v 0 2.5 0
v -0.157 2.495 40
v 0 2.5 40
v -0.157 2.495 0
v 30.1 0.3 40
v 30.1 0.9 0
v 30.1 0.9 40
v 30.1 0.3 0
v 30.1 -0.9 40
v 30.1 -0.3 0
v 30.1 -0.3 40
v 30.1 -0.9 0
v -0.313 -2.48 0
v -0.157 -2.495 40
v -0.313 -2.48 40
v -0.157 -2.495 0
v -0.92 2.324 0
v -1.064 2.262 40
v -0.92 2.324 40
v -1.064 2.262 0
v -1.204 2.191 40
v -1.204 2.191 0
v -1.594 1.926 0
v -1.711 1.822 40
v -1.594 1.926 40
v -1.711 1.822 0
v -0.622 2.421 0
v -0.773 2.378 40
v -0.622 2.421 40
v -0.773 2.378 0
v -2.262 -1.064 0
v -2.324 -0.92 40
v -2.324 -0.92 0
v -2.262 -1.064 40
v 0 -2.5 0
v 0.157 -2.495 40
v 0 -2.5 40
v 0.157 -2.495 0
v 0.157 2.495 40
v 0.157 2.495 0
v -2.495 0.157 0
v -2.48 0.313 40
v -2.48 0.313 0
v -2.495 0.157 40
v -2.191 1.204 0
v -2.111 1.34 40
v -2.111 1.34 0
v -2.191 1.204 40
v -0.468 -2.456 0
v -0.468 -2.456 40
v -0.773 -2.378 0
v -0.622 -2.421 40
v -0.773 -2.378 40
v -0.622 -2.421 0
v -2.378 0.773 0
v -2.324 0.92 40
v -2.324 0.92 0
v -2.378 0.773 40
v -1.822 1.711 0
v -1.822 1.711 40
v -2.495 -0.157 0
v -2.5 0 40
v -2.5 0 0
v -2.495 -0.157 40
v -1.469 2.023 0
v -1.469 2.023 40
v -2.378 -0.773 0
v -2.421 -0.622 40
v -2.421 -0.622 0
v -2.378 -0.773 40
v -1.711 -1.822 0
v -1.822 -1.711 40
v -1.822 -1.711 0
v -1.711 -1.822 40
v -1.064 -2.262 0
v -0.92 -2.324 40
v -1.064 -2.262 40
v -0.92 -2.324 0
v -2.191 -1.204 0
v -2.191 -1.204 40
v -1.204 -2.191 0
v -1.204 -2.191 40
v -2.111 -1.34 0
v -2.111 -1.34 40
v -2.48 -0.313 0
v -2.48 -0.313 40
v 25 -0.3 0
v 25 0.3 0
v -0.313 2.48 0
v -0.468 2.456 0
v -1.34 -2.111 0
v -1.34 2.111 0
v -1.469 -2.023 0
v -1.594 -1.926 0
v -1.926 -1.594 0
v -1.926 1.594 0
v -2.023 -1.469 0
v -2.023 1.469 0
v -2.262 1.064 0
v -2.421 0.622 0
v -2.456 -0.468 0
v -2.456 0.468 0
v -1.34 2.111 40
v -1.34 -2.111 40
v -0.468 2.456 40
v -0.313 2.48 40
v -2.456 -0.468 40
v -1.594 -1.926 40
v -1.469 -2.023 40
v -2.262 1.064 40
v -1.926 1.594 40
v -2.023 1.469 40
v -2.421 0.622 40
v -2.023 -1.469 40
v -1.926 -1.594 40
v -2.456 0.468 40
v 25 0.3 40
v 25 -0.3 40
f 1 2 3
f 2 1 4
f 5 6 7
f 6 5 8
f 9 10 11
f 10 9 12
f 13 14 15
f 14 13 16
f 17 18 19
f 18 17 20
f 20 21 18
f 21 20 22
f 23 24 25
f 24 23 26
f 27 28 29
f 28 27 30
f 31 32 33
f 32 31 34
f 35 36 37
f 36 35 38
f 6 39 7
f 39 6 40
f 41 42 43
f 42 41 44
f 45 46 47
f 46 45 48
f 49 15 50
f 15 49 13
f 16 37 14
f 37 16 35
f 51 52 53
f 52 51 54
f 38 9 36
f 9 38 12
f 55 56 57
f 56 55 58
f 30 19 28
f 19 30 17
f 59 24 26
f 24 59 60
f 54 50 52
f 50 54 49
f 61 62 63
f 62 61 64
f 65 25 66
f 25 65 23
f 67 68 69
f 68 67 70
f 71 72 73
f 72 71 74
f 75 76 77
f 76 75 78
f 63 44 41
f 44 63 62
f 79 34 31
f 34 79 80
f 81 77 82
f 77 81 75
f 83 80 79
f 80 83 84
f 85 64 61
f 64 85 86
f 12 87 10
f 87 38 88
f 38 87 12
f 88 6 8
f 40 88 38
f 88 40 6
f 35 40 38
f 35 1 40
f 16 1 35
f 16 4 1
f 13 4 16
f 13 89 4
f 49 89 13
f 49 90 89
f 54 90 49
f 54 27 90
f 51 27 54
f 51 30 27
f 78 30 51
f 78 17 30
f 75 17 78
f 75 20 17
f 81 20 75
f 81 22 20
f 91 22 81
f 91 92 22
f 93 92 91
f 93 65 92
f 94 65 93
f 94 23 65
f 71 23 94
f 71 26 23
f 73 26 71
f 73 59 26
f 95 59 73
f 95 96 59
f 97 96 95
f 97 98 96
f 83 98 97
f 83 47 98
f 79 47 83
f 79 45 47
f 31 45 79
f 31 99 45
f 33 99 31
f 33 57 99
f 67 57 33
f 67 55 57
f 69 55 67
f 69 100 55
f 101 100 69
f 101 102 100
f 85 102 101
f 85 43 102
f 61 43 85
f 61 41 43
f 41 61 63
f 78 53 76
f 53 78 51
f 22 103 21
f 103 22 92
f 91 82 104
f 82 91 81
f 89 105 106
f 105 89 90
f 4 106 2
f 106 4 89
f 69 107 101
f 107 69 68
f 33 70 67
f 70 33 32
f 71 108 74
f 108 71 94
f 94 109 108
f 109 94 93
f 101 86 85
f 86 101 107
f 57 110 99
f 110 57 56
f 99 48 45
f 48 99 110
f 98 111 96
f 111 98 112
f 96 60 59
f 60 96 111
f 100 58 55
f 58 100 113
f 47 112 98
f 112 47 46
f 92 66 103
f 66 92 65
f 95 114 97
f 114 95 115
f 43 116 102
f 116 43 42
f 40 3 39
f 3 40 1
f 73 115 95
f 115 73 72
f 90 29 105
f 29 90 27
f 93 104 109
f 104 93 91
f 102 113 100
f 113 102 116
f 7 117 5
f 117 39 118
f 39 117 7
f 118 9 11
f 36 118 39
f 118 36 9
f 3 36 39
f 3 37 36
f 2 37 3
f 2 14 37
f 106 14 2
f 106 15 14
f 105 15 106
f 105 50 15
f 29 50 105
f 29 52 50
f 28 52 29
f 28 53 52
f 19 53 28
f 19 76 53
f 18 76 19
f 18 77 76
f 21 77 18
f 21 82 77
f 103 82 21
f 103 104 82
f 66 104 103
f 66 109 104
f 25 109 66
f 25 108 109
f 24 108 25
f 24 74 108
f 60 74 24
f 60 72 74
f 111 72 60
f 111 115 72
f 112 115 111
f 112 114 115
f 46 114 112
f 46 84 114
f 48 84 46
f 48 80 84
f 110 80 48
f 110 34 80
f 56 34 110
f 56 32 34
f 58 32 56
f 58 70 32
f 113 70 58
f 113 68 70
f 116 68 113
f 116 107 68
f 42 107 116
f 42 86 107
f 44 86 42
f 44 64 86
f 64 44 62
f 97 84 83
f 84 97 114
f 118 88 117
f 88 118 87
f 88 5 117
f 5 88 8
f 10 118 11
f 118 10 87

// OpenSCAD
$fn=100;

d=5;
w=40;
l=30;
bt=0.6; // blade thickness
bi=5;
t=0.6;

difference(){
    hull(){
        cylinder(d=d, h=w);
        
        translate([l,-t-bt/2,0])
        cube([.1,t*2+bt,w]);
    }

    translate([l-bi,-bt/2,-.1])
    cube([bi*2,bt,w+1]);
}

%    translate([l-bi,-bt/2,0])
    cube([12,bt,w]);
